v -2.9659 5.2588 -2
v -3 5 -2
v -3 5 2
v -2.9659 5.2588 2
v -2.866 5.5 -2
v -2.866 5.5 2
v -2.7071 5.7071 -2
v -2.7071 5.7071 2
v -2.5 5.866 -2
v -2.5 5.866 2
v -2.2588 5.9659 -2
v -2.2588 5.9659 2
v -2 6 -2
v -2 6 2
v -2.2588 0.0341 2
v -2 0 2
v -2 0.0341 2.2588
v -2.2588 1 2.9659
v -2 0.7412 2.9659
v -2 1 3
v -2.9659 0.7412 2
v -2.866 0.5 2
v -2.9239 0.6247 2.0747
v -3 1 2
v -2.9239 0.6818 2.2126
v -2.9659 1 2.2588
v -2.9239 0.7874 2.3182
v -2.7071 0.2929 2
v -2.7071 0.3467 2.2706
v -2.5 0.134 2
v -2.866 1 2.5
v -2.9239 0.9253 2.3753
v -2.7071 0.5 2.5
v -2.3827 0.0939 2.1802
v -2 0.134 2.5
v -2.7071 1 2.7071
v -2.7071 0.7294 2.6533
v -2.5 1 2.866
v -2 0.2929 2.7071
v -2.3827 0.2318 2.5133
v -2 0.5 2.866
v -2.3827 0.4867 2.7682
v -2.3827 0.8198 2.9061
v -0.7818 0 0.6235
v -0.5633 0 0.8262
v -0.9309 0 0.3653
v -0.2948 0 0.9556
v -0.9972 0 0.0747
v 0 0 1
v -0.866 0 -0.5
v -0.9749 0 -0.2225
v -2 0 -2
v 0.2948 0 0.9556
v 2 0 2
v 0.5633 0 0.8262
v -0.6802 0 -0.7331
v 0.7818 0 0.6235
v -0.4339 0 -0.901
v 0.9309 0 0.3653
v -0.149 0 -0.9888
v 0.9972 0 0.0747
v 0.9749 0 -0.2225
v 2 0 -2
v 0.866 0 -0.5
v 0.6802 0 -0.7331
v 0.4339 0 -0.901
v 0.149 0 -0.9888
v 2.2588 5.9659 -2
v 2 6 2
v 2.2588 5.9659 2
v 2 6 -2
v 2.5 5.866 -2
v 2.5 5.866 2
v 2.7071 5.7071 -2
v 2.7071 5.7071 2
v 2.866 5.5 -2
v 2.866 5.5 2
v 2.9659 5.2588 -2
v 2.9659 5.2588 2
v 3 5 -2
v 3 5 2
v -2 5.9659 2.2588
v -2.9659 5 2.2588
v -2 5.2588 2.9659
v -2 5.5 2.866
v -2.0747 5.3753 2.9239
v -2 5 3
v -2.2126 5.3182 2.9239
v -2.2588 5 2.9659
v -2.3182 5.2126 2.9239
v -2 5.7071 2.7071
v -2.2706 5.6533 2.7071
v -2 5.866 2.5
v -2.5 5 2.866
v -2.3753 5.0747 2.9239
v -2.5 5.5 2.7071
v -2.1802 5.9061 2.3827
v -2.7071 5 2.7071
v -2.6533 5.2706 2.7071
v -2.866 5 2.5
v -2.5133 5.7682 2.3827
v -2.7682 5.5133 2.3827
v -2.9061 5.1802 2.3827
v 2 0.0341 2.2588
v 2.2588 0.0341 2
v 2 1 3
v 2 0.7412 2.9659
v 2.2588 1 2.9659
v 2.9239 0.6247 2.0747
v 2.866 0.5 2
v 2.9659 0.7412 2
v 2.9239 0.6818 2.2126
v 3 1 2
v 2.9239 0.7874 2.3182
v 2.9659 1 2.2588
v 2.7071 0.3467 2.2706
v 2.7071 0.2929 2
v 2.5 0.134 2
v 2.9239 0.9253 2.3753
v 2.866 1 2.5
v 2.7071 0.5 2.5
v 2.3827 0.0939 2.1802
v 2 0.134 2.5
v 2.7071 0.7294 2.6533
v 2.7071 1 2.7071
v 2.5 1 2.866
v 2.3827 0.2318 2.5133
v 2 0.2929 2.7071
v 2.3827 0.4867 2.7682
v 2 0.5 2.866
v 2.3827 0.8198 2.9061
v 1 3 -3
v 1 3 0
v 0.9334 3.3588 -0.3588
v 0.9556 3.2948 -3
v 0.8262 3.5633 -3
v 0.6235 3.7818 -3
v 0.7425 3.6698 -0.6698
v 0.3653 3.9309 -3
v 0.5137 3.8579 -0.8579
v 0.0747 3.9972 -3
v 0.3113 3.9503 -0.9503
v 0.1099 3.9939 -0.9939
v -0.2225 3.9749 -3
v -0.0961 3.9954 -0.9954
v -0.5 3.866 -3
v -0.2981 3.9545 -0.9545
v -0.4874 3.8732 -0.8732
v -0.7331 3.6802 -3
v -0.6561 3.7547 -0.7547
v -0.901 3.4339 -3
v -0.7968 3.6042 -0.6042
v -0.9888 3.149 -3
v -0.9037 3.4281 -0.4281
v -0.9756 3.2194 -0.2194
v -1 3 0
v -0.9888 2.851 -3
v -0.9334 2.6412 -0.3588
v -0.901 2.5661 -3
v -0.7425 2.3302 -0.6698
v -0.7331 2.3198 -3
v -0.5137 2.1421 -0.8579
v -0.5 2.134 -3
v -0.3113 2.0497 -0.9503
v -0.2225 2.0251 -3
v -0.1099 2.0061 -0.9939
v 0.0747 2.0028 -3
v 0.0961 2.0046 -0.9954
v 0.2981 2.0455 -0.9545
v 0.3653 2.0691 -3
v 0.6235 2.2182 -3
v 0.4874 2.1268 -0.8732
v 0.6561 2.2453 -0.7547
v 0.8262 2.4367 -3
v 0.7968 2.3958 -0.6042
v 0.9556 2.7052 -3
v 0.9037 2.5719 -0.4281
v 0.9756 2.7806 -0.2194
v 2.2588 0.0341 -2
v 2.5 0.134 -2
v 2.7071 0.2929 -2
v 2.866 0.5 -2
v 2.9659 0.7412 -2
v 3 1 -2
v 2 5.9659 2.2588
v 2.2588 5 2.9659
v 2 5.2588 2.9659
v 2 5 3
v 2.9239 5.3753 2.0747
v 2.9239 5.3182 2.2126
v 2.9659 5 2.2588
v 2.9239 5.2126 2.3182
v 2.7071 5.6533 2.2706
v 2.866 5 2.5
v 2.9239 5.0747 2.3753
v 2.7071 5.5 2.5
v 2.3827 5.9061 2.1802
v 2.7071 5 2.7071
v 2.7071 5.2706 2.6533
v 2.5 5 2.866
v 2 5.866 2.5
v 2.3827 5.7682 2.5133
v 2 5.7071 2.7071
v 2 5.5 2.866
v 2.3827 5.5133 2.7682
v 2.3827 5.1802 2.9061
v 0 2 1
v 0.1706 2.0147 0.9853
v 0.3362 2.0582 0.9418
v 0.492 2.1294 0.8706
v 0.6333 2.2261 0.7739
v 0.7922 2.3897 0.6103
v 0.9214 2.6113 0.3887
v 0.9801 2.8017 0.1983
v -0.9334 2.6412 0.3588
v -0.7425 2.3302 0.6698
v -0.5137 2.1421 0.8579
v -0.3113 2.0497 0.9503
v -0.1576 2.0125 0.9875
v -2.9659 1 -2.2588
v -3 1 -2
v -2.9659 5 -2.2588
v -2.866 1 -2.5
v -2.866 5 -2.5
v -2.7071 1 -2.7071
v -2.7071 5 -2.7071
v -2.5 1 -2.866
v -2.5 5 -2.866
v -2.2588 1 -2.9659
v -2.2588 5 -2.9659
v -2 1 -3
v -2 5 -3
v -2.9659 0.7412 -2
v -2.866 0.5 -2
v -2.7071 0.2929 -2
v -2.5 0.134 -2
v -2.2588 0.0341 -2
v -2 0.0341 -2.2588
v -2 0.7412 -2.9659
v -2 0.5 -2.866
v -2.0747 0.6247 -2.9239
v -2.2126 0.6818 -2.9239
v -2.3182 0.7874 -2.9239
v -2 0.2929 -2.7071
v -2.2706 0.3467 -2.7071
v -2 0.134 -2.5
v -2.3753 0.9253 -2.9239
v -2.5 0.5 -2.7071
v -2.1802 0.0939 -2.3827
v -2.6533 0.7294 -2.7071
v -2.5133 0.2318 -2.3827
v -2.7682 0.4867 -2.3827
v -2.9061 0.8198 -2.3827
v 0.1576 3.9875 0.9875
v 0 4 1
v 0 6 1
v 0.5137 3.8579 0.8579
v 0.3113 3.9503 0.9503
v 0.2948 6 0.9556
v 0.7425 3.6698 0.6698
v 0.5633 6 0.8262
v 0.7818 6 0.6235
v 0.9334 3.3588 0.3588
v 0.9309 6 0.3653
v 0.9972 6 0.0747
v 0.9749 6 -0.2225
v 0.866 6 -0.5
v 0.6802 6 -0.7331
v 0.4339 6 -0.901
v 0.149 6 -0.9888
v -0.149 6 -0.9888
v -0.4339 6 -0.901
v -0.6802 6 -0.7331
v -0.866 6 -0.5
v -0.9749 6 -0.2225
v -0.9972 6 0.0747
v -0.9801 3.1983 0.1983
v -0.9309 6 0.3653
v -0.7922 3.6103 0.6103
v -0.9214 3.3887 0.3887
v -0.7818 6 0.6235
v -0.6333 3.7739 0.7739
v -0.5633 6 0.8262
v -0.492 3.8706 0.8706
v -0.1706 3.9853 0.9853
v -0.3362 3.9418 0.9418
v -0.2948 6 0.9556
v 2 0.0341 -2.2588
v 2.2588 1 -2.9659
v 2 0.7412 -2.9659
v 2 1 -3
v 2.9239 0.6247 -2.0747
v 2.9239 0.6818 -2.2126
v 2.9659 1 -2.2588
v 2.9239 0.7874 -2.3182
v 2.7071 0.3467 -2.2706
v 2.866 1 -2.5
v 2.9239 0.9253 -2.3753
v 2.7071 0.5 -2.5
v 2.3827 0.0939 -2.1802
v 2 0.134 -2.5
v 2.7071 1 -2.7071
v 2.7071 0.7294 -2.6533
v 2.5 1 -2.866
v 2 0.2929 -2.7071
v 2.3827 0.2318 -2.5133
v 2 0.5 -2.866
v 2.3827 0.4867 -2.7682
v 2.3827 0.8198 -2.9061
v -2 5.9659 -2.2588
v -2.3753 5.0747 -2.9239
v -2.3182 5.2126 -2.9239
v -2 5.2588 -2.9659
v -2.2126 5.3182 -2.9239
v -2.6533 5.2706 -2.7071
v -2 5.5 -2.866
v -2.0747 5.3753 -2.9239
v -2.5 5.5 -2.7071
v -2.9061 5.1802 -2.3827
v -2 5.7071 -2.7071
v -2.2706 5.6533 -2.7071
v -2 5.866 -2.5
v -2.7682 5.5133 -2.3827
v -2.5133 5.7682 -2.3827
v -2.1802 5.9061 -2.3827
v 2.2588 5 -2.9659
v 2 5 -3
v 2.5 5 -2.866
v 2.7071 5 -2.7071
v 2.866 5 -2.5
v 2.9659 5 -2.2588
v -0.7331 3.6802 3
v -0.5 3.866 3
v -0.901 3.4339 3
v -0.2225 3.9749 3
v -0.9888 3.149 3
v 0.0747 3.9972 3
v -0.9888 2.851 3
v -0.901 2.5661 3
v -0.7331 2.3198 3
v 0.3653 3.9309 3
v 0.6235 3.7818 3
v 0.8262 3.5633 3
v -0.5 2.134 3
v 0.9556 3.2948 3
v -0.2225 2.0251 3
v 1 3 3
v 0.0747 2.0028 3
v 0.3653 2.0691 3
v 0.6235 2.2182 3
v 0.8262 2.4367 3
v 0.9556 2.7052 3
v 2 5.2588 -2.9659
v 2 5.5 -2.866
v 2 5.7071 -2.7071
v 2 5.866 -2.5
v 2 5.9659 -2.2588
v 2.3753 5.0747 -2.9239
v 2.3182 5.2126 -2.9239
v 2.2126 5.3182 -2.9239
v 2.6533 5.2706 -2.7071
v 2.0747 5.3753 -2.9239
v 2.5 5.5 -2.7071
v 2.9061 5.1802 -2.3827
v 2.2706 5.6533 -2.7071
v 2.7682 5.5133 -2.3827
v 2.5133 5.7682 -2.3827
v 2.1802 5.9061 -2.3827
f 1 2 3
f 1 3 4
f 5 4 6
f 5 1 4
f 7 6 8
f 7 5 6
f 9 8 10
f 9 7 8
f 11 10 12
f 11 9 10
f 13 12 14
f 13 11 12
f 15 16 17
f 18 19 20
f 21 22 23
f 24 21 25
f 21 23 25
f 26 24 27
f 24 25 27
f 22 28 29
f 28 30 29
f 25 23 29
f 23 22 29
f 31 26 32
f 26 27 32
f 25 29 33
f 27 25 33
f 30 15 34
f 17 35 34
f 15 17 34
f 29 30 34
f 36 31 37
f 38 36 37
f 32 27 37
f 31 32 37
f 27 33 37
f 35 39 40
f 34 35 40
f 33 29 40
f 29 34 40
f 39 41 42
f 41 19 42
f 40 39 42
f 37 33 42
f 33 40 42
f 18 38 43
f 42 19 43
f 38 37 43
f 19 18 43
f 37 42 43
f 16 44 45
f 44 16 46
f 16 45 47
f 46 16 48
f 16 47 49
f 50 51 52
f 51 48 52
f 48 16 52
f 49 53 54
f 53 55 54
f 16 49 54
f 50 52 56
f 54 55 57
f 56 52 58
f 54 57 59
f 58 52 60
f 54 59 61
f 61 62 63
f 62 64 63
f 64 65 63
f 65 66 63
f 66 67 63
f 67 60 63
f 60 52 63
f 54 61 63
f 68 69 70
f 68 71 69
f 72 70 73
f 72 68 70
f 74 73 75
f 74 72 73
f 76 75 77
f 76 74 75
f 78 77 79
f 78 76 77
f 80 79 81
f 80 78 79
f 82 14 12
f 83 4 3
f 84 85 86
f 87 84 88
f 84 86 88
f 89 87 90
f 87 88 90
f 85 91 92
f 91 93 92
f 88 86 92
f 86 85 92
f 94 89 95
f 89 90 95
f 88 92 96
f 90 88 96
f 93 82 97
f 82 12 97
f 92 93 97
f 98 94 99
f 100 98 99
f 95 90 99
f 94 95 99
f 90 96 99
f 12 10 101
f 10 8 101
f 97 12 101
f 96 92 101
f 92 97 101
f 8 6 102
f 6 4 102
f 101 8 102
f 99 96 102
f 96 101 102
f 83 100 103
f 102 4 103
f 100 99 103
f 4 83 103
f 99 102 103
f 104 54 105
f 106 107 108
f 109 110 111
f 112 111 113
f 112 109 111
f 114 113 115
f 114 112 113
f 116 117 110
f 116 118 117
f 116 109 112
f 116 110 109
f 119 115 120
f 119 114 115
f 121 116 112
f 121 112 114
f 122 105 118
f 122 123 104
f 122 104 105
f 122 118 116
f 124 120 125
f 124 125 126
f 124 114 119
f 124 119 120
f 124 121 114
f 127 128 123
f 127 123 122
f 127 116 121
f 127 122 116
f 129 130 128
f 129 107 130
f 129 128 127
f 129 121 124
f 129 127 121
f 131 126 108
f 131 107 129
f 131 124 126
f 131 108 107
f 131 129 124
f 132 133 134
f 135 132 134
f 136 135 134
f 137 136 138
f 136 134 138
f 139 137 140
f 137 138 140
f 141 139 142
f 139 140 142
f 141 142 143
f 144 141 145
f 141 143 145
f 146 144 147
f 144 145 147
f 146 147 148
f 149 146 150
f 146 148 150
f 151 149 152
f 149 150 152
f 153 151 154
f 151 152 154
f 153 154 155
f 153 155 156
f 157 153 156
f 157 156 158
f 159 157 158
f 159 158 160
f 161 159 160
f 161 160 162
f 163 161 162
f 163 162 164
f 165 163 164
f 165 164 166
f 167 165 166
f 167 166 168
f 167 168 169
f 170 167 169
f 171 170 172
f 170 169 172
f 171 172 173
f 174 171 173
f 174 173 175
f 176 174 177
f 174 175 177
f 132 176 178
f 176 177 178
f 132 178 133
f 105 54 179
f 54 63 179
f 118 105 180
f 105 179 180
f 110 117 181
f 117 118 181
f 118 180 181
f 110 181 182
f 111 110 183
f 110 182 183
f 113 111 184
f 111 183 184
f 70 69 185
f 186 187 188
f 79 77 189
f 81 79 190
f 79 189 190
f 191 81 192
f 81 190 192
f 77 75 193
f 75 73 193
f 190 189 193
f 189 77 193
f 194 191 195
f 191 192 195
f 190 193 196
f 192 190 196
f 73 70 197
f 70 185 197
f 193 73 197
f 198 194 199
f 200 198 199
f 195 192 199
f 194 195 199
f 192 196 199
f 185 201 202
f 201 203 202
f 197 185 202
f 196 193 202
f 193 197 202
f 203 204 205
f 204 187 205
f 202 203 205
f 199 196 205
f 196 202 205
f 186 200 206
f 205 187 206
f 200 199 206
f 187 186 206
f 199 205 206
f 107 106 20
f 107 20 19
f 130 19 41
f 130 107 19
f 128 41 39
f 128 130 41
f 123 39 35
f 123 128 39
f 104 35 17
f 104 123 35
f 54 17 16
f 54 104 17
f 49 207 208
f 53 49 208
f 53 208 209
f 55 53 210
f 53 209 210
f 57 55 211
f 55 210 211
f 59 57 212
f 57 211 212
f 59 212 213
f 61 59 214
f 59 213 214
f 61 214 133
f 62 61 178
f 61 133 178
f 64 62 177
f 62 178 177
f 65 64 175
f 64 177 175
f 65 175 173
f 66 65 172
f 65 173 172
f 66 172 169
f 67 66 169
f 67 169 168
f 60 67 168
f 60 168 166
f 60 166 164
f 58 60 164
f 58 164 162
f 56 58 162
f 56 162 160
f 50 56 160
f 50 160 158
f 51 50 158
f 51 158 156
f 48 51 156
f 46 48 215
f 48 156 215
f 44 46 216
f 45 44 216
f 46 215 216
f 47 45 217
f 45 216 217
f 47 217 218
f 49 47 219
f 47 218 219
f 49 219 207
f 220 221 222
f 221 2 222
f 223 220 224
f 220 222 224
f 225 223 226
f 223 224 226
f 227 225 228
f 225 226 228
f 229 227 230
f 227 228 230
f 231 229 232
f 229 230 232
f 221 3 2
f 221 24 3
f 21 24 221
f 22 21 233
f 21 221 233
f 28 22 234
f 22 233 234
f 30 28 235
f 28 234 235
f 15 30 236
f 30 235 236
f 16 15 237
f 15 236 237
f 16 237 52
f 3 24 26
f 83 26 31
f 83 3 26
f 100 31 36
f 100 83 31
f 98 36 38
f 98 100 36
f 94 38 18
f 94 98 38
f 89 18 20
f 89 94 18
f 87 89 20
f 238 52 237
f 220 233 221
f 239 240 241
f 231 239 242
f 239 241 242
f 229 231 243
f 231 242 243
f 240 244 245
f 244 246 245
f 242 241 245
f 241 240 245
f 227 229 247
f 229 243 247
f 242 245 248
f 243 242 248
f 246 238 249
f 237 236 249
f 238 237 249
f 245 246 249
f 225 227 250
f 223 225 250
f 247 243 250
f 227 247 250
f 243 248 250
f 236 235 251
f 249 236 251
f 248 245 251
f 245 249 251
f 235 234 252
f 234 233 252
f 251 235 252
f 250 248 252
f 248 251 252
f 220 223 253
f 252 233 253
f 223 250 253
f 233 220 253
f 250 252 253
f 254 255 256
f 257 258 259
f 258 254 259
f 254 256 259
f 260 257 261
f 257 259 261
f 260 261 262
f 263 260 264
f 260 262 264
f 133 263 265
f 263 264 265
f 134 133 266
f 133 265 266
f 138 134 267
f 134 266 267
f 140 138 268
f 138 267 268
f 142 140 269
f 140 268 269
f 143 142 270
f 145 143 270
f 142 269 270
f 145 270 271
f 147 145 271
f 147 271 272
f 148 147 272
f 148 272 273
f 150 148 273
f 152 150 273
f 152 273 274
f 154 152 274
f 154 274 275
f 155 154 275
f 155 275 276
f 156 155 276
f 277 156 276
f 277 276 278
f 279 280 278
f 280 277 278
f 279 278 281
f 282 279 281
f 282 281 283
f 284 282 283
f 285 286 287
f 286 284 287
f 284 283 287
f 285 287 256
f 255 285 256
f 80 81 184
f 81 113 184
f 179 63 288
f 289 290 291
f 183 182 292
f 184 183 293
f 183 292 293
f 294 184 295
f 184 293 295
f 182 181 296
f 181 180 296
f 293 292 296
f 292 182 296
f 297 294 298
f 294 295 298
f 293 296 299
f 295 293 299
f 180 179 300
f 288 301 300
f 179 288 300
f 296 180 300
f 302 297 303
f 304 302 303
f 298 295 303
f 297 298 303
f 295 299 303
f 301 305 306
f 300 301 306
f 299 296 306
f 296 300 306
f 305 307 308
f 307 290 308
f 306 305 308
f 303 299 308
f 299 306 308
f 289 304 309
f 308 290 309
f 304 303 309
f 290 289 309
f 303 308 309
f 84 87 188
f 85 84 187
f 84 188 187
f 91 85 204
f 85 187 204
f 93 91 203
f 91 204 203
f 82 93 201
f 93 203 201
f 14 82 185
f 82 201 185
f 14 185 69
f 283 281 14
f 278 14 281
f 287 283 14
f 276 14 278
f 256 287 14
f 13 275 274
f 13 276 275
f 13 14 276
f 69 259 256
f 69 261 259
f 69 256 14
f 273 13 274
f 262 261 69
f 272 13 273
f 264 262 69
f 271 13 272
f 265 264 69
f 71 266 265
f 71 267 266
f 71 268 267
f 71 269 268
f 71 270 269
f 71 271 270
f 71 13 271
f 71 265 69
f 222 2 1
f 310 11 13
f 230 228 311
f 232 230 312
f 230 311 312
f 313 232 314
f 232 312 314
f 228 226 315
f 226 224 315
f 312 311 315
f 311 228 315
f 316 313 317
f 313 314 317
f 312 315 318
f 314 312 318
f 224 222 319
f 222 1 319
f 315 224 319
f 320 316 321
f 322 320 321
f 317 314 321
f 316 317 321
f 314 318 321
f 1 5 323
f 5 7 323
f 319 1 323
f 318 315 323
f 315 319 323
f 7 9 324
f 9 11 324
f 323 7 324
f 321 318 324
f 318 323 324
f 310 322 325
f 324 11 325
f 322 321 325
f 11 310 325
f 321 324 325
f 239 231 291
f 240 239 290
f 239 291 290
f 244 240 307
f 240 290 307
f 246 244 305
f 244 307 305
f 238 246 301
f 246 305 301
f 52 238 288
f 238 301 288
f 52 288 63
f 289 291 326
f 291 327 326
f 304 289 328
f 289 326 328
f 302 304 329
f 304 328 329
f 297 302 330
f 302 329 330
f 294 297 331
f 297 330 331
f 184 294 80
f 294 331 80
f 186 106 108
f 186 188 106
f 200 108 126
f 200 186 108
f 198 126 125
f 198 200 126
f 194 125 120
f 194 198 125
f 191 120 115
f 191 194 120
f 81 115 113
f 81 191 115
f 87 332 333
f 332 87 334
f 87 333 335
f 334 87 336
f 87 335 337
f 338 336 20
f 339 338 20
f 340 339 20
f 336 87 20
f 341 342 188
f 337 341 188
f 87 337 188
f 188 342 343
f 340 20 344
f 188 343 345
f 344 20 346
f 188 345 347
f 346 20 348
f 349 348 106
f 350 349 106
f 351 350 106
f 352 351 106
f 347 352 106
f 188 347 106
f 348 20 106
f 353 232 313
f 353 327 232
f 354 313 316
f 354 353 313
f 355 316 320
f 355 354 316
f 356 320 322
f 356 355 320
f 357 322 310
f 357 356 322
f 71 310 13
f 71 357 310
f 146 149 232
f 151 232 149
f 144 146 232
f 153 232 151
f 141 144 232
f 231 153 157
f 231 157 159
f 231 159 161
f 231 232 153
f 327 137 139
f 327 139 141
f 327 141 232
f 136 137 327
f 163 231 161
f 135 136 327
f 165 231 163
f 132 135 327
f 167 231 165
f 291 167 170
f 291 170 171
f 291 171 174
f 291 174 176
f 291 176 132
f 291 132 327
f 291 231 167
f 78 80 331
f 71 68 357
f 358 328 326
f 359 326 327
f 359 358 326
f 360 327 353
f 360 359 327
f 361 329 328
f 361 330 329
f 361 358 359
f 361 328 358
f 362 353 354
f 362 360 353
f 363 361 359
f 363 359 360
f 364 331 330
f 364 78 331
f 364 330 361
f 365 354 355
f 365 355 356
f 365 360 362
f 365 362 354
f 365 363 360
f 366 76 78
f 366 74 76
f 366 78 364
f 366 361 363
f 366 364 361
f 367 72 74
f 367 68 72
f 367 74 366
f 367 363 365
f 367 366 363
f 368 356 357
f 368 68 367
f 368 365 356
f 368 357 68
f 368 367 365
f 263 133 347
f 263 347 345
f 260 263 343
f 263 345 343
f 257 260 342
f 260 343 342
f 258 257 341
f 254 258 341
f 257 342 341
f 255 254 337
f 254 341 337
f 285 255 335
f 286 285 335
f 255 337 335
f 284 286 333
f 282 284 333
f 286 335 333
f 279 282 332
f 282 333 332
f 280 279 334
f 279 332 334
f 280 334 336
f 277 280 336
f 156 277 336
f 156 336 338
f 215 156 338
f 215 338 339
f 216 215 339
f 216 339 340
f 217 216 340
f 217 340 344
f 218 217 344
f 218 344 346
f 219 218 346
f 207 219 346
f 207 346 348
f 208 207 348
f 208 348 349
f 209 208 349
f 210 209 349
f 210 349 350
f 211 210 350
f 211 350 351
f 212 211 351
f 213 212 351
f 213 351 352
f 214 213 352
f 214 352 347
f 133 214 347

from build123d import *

# Parameters (mm, degrees)
SKETCH3_W           = 6
SKETCH3_H           = 6
BOSS_EXTRUDE1_DEPTH = 6
SKETCH4_R           = 1
CUT_EXTRUDE1_DEPTH  = 6
CUT_EXTRUDE2_REACH  = 9.348
SKETCH5_R           = 1
FILLET1_R           = 1


with BuildPart() as part:
    # Sketch3 → Boss-Extrude1 (new body)
    with BuildSketch(Plane(origin=(0, 0, 0), x_dir=(1, 0, 0), z_dir=(0, 1, 0))):
        Rectangle(SKETCH3_W, SKETCH3_H)
    extrude(amount=BOSS_EXTRUDE1_DEPTH)

    # Sketch4 → Cut-Extrude1 (cut)
    with BuildSketch(Plane.XY.offset(3)):
        with Locations((0, 3)):
            Circle(SKETCH4_R)
    extrude(amount=-CUT_EXTRUDE1_DEPTH, mode=Mode.SUBTRACT)

    # Cut-Extrude2: up to this face of the body (flat: up to its plane)
    cut_extrude2_end = Plane(part.part.faces().sort_by_distance((0, 0, 0))[0])
    # Sketch5 → Cut-Extrude2 (cut, up to the picked face)
    with BuildSketch(Plane(origin=(0, 6, 0), x_dir=(1, 0, 0), z_dir=(0, 1, 0)), mode=Mode.PRIVATE) as cut_extrude2_sk1:
        with Locations(Location((0, 0, 0), (0, 0, 270))):
            Circle(SKETCH5_R)
    cut_extrude2_tool1 = split(extrude(cut_extrude2_sk1.sketch, amount=-CUT_EXTRUDE2_REACH, mode=Mode.PRIVATE), bisect_by=cut_extrude2_end, keep=Keep.BOTH, mode=Mode.PRIVATE)
    add(cut_extrude2_tool1.solids().sort_by(Axis((0, 6, 0), (0, -1, 0)))[0], mode=Mode.SUBTRACT)

    # Fillet1
    fillet1_edges = [part.edges().sort_by_distance(p)[0] for p in [
        (-3, 6, 0),
        (0, 6, 3),
        (3, 6, 0),
        (0, 0, 3),
        (-3, 0, 0),
        (0, 0, -3),
        (3, 0, 0),
        (3, 3, 3),
        (-3, 3, 3),
        (-3, 3, -3),
        (3, 3, -3),
        (0, 6, -3),
    ]]
    fillet(fillet1_edges, radius=FILLET1_R)


solid = part.part
